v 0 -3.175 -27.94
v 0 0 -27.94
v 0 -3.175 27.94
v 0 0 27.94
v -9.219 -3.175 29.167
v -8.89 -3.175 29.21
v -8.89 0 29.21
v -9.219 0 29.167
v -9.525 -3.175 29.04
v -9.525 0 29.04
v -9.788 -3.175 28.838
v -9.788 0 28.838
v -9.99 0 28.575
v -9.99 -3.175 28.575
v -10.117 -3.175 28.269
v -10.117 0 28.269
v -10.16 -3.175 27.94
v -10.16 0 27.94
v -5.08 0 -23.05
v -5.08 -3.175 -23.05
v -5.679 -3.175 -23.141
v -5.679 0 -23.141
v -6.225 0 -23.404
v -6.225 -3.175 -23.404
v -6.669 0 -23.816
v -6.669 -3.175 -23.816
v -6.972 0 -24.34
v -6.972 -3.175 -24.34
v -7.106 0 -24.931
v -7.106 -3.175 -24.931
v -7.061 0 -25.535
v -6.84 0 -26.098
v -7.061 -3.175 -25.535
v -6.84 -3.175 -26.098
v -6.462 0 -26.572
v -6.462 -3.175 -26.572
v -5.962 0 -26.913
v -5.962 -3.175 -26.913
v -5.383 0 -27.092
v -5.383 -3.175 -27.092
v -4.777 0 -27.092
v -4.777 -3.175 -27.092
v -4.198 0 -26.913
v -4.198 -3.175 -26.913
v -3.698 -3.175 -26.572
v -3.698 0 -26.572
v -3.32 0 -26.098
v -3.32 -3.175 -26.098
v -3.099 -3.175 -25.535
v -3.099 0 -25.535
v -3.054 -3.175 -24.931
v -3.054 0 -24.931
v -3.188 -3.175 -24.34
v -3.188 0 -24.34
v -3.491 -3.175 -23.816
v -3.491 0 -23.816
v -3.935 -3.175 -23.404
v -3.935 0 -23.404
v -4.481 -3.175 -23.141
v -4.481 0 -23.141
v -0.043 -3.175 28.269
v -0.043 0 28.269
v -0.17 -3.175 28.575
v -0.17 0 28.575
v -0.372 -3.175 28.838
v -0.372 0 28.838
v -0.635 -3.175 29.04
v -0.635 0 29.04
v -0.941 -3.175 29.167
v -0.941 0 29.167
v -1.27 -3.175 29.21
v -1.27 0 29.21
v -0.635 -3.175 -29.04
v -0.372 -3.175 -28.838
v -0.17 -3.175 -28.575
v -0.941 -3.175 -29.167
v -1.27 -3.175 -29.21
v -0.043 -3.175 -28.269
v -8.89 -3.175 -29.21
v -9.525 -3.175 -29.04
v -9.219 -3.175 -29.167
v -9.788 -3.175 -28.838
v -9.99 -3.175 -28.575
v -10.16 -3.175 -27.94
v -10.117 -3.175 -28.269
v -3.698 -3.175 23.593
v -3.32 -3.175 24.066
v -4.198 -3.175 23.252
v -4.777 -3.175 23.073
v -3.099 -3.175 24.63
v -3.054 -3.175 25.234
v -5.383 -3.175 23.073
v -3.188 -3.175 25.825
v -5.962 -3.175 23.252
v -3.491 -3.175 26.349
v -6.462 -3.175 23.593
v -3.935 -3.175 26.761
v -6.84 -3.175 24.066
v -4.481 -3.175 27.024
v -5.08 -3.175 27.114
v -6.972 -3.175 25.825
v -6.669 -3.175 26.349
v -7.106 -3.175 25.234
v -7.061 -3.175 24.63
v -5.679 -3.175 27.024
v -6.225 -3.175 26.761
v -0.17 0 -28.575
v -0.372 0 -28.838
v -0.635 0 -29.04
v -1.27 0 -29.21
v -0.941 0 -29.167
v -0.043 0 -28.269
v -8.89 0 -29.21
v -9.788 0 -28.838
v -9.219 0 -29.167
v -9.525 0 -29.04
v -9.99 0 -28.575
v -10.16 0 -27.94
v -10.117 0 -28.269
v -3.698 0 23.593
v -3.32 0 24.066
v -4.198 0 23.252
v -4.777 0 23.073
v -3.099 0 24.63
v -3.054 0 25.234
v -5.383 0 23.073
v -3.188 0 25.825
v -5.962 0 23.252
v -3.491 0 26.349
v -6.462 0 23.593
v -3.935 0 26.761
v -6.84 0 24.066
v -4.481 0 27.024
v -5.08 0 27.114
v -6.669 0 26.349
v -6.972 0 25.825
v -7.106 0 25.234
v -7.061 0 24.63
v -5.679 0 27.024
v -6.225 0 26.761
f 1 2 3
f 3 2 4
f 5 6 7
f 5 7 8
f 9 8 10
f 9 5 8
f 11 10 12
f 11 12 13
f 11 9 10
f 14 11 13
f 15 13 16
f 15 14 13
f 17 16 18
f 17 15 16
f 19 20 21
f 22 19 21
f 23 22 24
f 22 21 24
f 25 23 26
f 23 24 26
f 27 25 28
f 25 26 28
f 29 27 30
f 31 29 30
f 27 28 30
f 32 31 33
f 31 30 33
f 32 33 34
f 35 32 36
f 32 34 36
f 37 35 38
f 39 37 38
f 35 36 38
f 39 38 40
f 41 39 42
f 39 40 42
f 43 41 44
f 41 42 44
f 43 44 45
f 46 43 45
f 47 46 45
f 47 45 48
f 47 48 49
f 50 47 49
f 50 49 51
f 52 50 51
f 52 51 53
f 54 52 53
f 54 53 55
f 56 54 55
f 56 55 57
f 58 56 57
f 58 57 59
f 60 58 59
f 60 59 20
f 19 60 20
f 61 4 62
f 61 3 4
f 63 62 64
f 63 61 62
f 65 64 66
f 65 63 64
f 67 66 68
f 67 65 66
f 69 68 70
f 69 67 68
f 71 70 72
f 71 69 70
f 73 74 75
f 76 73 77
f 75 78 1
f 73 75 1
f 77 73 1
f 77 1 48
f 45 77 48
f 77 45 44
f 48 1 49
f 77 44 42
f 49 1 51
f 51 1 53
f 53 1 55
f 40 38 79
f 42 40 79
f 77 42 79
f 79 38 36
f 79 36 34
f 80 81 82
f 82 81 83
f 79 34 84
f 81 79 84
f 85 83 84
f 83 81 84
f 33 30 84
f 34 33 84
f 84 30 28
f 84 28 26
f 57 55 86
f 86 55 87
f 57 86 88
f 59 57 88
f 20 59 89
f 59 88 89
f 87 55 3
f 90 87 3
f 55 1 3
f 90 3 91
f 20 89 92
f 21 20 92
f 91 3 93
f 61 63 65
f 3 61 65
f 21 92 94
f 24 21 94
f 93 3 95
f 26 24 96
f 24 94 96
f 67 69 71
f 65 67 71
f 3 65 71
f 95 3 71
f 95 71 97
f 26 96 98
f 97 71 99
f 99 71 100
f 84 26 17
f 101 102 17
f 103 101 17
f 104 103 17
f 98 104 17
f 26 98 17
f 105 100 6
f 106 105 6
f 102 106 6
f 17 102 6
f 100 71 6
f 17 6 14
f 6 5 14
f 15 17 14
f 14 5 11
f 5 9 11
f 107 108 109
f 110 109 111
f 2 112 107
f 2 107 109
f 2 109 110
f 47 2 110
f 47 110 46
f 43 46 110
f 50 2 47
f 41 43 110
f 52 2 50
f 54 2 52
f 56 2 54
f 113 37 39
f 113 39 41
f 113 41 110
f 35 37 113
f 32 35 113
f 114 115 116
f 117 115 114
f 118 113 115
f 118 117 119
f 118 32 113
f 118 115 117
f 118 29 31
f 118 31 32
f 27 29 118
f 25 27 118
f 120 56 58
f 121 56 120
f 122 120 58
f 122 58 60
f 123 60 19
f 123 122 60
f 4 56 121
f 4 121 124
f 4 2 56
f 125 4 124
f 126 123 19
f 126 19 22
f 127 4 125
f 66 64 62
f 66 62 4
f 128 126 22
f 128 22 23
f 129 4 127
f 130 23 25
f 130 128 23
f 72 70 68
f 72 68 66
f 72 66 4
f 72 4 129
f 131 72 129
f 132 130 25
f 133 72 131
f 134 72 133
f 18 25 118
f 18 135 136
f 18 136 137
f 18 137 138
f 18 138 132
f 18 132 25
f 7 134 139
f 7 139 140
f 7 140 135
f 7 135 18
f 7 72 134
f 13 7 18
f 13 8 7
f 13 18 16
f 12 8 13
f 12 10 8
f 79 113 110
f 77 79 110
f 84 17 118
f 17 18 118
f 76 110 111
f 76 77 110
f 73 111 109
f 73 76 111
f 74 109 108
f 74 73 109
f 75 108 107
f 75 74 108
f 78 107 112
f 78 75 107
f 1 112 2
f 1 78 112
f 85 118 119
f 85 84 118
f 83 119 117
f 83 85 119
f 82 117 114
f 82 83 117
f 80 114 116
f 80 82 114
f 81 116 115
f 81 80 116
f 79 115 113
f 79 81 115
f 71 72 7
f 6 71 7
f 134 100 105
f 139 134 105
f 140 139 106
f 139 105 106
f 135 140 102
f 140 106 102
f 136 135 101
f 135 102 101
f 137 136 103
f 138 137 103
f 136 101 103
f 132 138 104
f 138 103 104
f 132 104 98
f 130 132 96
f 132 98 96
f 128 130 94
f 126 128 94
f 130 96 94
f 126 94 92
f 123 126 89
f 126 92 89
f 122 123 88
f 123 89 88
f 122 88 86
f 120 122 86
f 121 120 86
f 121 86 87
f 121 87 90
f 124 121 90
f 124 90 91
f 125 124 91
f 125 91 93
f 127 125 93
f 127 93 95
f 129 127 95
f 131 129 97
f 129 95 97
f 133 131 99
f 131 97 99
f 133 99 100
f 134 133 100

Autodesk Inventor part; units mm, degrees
ref_plane "YZ Plane" through (0, 0, 0) normal (1, 0, 0) x (0, 1, 0)
ref_plane "XZ Plane" through (0, 0, 0) normal (0, 1, 0) x (-1, 0, 0)
ref_plane "XY Plane" through (0, 0, 0) normal (0, 0, 1) x (1, 0, 0)
sketch "Sketch1" plane through (0, 0, 0) normal (0, 1, 0) x (-1, 0, 0)
  line L0 (-2.032, 0) -> (12.192, 0) projected
  line L1 (0, -40.894) -> (0, 40.894) projected
  line L2 (10.16, -29.21) -> (0, -29.21)
  line L3 (0, -29.21) -> (0, 29.21)
  line L4 (0, 29.21) -> (10.16, 29.21)
  line L5 (10.16, 29.21) -> (10.16, -29.21)
  line L6 (10.16, -29.21) -> (0, 29.21) construction
  line L7 (0, -29.21) -> (10.16, 29.21) construction
  point P0 (0, 0)
  point P1 (5.08, 0)
  point P2 (5.08, 25.0825)
  point P3 (5.08, 0)
  point P4 (5.08, -25.0825)
  point P5 (0, -29.21)
  dimension "d0" = 58.42
  dimension "d1" = 10.16
  dimension "d2" = 5.08
  dimension "d3" = 25.0825
  dimension "d4" = 25.0825
extrude "Extrusion1" add sketch "Sketch1" against normal blind 3.175
fillet "Fillet1" radius 1.27 2 edges at (-10.16, -1.5875, 29.21) (-10.16, -1.5875, -29.21)
fillet "Fillet2" radius 1.27 2 edges at (0, -1.5875, 29.21) (0, -1.5875, -29.21)
hole "Hole1" at (-5.08, 0, 25.0825) at (-5.08, 0, -25.0825) direction (0, -1, 0) diameter 4.064 end through all
equation "\"d4\" = d3"
